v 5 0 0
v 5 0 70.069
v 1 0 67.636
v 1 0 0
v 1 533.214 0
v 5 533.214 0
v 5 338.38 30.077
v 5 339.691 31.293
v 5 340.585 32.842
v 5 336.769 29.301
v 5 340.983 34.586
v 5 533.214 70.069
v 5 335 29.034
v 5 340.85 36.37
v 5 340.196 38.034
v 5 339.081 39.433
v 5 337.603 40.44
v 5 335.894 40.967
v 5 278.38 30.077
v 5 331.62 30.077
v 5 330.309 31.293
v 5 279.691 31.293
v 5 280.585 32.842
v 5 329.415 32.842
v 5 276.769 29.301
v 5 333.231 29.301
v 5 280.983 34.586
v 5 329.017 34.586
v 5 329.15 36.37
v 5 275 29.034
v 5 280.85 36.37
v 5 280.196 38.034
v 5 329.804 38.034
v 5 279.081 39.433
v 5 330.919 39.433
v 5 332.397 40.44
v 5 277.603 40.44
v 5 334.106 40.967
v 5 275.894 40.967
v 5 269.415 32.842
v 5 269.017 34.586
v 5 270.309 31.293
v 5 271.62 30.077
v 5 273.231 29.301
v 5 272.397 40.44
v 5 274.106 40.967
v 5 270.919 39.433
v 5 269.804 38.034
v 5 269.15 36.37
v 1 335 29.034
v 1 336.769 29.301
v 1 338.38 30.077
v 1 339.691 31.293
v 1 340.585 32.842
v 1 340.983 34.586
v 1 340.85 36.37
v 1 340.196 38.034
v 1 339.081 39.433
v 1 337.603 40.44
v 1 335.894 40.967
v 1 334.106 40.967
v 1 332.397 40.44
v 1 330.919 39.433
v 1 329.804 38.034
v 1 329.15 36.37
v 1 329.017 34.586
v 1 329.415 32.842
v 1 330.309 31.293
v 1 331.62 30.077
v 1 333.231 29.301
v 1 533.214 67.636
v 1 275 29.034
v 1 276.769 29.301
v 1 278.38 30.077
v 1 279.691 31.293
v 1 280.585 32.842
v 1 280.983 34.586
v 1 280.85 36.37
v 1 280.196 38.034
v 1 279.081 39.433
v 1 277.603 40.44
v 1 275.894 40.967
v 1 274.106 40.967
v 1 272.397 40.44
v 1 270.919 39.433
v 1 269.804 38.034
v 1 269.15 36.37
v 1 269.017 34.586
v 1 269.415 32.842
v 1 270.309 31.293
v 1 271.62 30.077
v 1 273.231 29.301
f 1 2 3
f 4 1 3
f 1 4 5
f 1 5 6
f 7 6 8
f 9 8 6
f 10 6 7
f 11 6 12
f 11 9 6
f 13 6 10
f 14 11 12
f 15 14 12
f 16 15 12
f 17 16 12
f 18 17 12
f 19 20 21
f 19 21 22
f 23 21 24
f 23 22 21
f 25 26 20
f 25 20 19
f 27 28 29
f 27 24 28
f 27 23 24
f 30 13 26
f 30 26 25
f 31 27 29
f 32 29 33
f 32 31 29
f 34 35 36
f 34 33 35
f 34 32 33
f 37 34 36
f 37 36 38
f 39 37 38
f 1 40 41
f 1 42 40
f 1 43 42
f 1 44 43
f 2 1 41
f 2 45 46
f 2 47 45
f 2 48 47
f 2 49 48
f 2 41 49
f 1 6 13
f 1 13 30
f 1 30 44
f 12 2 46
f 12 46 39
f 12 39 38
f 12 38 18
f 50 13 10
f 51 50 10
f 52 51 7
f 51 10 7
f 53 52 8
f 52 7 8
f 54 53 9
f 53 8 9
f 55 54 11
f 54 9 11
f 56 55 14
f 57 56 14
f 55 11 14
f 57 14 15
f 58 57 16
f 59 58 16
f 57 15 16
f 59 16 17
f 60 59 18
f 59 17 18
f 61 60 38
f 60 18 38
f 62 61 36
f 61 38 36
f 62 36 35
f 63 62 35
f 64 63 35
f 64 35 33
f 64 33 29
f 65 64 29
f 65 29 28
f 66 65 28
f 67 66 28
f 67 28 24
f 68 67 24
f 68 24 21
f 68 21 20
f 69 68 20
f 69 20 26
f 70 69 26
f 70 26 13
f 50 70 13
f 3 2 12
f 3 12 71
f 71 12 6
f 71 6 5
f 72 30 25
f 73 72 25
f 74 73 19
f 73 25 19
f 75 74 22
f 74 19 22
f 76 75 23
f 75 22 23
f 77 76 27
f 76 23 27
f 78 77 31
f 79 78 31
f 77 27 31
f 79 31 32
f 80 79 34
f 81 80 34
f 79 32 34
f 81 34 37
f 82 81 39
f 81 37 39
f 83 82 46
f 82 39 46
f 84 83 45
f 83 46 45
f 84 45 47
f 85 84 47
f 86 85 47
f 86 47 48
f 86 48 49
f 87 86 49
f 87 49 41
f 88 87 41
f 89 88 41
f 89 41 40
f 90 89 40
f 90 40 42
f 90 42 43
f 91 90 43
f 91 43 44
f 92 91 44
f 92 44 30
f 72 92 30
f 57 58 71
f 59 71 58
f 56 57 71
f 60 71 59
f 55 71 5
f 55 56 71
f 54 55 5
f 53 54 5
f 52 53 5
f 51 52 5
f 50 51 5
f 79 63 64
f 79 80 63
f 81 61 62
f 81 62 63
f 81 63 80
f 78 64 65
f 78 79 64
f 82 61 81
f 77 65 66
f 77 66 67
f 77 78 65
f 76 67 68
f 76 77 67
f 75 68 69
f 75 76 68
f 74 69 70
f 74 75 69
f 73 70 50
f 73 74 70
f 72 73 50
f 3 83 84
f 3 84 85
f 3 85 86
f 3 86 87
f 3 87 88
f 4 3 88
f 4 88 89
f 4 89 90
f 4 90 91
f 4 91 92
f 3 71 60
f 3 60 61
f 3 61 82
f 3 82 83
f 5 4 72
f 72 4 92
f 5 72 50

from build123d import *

# Parameters (mm, degrees)
EXTRUDE_1_DEPTH    = 533.213673317
SKETCH1_R          = 6
CUT_EXTRUDE1_DEPTH = 538.812661937


with BuildPart() as part:
    # Эскиз1 → Вытянуть1 (new body)
    with BuildSketch(Plane(origin=(0, 0, 0), x_dir=(1, 0, 0), z_dir=(0, 1, 0))):
        Polygon((1, 0), (5, 0), (5, -70.068808523), (1, -67.636001514), align=None)
    extrude(amount=EXTRUDE_1_DEPTH)

    # Sketch1 → Cut-Extrude1 (cut, through all)
    with BuildSketch(Plane(origin=(5, 0, 0), x_dir=(0, 0, -1), z_dir=(1, 0, 0))):
        with Locations((-35.034404262, 335)):
            Circle(SKETCH1_R)
        with Locations((-35.034404262, 275)):
            Circle(SKETCH1_R)
    extrude(amount=-CUT_EXTRUDE1_DEPTH, mode=Mode.SUBTRACT)


solid = part.part
